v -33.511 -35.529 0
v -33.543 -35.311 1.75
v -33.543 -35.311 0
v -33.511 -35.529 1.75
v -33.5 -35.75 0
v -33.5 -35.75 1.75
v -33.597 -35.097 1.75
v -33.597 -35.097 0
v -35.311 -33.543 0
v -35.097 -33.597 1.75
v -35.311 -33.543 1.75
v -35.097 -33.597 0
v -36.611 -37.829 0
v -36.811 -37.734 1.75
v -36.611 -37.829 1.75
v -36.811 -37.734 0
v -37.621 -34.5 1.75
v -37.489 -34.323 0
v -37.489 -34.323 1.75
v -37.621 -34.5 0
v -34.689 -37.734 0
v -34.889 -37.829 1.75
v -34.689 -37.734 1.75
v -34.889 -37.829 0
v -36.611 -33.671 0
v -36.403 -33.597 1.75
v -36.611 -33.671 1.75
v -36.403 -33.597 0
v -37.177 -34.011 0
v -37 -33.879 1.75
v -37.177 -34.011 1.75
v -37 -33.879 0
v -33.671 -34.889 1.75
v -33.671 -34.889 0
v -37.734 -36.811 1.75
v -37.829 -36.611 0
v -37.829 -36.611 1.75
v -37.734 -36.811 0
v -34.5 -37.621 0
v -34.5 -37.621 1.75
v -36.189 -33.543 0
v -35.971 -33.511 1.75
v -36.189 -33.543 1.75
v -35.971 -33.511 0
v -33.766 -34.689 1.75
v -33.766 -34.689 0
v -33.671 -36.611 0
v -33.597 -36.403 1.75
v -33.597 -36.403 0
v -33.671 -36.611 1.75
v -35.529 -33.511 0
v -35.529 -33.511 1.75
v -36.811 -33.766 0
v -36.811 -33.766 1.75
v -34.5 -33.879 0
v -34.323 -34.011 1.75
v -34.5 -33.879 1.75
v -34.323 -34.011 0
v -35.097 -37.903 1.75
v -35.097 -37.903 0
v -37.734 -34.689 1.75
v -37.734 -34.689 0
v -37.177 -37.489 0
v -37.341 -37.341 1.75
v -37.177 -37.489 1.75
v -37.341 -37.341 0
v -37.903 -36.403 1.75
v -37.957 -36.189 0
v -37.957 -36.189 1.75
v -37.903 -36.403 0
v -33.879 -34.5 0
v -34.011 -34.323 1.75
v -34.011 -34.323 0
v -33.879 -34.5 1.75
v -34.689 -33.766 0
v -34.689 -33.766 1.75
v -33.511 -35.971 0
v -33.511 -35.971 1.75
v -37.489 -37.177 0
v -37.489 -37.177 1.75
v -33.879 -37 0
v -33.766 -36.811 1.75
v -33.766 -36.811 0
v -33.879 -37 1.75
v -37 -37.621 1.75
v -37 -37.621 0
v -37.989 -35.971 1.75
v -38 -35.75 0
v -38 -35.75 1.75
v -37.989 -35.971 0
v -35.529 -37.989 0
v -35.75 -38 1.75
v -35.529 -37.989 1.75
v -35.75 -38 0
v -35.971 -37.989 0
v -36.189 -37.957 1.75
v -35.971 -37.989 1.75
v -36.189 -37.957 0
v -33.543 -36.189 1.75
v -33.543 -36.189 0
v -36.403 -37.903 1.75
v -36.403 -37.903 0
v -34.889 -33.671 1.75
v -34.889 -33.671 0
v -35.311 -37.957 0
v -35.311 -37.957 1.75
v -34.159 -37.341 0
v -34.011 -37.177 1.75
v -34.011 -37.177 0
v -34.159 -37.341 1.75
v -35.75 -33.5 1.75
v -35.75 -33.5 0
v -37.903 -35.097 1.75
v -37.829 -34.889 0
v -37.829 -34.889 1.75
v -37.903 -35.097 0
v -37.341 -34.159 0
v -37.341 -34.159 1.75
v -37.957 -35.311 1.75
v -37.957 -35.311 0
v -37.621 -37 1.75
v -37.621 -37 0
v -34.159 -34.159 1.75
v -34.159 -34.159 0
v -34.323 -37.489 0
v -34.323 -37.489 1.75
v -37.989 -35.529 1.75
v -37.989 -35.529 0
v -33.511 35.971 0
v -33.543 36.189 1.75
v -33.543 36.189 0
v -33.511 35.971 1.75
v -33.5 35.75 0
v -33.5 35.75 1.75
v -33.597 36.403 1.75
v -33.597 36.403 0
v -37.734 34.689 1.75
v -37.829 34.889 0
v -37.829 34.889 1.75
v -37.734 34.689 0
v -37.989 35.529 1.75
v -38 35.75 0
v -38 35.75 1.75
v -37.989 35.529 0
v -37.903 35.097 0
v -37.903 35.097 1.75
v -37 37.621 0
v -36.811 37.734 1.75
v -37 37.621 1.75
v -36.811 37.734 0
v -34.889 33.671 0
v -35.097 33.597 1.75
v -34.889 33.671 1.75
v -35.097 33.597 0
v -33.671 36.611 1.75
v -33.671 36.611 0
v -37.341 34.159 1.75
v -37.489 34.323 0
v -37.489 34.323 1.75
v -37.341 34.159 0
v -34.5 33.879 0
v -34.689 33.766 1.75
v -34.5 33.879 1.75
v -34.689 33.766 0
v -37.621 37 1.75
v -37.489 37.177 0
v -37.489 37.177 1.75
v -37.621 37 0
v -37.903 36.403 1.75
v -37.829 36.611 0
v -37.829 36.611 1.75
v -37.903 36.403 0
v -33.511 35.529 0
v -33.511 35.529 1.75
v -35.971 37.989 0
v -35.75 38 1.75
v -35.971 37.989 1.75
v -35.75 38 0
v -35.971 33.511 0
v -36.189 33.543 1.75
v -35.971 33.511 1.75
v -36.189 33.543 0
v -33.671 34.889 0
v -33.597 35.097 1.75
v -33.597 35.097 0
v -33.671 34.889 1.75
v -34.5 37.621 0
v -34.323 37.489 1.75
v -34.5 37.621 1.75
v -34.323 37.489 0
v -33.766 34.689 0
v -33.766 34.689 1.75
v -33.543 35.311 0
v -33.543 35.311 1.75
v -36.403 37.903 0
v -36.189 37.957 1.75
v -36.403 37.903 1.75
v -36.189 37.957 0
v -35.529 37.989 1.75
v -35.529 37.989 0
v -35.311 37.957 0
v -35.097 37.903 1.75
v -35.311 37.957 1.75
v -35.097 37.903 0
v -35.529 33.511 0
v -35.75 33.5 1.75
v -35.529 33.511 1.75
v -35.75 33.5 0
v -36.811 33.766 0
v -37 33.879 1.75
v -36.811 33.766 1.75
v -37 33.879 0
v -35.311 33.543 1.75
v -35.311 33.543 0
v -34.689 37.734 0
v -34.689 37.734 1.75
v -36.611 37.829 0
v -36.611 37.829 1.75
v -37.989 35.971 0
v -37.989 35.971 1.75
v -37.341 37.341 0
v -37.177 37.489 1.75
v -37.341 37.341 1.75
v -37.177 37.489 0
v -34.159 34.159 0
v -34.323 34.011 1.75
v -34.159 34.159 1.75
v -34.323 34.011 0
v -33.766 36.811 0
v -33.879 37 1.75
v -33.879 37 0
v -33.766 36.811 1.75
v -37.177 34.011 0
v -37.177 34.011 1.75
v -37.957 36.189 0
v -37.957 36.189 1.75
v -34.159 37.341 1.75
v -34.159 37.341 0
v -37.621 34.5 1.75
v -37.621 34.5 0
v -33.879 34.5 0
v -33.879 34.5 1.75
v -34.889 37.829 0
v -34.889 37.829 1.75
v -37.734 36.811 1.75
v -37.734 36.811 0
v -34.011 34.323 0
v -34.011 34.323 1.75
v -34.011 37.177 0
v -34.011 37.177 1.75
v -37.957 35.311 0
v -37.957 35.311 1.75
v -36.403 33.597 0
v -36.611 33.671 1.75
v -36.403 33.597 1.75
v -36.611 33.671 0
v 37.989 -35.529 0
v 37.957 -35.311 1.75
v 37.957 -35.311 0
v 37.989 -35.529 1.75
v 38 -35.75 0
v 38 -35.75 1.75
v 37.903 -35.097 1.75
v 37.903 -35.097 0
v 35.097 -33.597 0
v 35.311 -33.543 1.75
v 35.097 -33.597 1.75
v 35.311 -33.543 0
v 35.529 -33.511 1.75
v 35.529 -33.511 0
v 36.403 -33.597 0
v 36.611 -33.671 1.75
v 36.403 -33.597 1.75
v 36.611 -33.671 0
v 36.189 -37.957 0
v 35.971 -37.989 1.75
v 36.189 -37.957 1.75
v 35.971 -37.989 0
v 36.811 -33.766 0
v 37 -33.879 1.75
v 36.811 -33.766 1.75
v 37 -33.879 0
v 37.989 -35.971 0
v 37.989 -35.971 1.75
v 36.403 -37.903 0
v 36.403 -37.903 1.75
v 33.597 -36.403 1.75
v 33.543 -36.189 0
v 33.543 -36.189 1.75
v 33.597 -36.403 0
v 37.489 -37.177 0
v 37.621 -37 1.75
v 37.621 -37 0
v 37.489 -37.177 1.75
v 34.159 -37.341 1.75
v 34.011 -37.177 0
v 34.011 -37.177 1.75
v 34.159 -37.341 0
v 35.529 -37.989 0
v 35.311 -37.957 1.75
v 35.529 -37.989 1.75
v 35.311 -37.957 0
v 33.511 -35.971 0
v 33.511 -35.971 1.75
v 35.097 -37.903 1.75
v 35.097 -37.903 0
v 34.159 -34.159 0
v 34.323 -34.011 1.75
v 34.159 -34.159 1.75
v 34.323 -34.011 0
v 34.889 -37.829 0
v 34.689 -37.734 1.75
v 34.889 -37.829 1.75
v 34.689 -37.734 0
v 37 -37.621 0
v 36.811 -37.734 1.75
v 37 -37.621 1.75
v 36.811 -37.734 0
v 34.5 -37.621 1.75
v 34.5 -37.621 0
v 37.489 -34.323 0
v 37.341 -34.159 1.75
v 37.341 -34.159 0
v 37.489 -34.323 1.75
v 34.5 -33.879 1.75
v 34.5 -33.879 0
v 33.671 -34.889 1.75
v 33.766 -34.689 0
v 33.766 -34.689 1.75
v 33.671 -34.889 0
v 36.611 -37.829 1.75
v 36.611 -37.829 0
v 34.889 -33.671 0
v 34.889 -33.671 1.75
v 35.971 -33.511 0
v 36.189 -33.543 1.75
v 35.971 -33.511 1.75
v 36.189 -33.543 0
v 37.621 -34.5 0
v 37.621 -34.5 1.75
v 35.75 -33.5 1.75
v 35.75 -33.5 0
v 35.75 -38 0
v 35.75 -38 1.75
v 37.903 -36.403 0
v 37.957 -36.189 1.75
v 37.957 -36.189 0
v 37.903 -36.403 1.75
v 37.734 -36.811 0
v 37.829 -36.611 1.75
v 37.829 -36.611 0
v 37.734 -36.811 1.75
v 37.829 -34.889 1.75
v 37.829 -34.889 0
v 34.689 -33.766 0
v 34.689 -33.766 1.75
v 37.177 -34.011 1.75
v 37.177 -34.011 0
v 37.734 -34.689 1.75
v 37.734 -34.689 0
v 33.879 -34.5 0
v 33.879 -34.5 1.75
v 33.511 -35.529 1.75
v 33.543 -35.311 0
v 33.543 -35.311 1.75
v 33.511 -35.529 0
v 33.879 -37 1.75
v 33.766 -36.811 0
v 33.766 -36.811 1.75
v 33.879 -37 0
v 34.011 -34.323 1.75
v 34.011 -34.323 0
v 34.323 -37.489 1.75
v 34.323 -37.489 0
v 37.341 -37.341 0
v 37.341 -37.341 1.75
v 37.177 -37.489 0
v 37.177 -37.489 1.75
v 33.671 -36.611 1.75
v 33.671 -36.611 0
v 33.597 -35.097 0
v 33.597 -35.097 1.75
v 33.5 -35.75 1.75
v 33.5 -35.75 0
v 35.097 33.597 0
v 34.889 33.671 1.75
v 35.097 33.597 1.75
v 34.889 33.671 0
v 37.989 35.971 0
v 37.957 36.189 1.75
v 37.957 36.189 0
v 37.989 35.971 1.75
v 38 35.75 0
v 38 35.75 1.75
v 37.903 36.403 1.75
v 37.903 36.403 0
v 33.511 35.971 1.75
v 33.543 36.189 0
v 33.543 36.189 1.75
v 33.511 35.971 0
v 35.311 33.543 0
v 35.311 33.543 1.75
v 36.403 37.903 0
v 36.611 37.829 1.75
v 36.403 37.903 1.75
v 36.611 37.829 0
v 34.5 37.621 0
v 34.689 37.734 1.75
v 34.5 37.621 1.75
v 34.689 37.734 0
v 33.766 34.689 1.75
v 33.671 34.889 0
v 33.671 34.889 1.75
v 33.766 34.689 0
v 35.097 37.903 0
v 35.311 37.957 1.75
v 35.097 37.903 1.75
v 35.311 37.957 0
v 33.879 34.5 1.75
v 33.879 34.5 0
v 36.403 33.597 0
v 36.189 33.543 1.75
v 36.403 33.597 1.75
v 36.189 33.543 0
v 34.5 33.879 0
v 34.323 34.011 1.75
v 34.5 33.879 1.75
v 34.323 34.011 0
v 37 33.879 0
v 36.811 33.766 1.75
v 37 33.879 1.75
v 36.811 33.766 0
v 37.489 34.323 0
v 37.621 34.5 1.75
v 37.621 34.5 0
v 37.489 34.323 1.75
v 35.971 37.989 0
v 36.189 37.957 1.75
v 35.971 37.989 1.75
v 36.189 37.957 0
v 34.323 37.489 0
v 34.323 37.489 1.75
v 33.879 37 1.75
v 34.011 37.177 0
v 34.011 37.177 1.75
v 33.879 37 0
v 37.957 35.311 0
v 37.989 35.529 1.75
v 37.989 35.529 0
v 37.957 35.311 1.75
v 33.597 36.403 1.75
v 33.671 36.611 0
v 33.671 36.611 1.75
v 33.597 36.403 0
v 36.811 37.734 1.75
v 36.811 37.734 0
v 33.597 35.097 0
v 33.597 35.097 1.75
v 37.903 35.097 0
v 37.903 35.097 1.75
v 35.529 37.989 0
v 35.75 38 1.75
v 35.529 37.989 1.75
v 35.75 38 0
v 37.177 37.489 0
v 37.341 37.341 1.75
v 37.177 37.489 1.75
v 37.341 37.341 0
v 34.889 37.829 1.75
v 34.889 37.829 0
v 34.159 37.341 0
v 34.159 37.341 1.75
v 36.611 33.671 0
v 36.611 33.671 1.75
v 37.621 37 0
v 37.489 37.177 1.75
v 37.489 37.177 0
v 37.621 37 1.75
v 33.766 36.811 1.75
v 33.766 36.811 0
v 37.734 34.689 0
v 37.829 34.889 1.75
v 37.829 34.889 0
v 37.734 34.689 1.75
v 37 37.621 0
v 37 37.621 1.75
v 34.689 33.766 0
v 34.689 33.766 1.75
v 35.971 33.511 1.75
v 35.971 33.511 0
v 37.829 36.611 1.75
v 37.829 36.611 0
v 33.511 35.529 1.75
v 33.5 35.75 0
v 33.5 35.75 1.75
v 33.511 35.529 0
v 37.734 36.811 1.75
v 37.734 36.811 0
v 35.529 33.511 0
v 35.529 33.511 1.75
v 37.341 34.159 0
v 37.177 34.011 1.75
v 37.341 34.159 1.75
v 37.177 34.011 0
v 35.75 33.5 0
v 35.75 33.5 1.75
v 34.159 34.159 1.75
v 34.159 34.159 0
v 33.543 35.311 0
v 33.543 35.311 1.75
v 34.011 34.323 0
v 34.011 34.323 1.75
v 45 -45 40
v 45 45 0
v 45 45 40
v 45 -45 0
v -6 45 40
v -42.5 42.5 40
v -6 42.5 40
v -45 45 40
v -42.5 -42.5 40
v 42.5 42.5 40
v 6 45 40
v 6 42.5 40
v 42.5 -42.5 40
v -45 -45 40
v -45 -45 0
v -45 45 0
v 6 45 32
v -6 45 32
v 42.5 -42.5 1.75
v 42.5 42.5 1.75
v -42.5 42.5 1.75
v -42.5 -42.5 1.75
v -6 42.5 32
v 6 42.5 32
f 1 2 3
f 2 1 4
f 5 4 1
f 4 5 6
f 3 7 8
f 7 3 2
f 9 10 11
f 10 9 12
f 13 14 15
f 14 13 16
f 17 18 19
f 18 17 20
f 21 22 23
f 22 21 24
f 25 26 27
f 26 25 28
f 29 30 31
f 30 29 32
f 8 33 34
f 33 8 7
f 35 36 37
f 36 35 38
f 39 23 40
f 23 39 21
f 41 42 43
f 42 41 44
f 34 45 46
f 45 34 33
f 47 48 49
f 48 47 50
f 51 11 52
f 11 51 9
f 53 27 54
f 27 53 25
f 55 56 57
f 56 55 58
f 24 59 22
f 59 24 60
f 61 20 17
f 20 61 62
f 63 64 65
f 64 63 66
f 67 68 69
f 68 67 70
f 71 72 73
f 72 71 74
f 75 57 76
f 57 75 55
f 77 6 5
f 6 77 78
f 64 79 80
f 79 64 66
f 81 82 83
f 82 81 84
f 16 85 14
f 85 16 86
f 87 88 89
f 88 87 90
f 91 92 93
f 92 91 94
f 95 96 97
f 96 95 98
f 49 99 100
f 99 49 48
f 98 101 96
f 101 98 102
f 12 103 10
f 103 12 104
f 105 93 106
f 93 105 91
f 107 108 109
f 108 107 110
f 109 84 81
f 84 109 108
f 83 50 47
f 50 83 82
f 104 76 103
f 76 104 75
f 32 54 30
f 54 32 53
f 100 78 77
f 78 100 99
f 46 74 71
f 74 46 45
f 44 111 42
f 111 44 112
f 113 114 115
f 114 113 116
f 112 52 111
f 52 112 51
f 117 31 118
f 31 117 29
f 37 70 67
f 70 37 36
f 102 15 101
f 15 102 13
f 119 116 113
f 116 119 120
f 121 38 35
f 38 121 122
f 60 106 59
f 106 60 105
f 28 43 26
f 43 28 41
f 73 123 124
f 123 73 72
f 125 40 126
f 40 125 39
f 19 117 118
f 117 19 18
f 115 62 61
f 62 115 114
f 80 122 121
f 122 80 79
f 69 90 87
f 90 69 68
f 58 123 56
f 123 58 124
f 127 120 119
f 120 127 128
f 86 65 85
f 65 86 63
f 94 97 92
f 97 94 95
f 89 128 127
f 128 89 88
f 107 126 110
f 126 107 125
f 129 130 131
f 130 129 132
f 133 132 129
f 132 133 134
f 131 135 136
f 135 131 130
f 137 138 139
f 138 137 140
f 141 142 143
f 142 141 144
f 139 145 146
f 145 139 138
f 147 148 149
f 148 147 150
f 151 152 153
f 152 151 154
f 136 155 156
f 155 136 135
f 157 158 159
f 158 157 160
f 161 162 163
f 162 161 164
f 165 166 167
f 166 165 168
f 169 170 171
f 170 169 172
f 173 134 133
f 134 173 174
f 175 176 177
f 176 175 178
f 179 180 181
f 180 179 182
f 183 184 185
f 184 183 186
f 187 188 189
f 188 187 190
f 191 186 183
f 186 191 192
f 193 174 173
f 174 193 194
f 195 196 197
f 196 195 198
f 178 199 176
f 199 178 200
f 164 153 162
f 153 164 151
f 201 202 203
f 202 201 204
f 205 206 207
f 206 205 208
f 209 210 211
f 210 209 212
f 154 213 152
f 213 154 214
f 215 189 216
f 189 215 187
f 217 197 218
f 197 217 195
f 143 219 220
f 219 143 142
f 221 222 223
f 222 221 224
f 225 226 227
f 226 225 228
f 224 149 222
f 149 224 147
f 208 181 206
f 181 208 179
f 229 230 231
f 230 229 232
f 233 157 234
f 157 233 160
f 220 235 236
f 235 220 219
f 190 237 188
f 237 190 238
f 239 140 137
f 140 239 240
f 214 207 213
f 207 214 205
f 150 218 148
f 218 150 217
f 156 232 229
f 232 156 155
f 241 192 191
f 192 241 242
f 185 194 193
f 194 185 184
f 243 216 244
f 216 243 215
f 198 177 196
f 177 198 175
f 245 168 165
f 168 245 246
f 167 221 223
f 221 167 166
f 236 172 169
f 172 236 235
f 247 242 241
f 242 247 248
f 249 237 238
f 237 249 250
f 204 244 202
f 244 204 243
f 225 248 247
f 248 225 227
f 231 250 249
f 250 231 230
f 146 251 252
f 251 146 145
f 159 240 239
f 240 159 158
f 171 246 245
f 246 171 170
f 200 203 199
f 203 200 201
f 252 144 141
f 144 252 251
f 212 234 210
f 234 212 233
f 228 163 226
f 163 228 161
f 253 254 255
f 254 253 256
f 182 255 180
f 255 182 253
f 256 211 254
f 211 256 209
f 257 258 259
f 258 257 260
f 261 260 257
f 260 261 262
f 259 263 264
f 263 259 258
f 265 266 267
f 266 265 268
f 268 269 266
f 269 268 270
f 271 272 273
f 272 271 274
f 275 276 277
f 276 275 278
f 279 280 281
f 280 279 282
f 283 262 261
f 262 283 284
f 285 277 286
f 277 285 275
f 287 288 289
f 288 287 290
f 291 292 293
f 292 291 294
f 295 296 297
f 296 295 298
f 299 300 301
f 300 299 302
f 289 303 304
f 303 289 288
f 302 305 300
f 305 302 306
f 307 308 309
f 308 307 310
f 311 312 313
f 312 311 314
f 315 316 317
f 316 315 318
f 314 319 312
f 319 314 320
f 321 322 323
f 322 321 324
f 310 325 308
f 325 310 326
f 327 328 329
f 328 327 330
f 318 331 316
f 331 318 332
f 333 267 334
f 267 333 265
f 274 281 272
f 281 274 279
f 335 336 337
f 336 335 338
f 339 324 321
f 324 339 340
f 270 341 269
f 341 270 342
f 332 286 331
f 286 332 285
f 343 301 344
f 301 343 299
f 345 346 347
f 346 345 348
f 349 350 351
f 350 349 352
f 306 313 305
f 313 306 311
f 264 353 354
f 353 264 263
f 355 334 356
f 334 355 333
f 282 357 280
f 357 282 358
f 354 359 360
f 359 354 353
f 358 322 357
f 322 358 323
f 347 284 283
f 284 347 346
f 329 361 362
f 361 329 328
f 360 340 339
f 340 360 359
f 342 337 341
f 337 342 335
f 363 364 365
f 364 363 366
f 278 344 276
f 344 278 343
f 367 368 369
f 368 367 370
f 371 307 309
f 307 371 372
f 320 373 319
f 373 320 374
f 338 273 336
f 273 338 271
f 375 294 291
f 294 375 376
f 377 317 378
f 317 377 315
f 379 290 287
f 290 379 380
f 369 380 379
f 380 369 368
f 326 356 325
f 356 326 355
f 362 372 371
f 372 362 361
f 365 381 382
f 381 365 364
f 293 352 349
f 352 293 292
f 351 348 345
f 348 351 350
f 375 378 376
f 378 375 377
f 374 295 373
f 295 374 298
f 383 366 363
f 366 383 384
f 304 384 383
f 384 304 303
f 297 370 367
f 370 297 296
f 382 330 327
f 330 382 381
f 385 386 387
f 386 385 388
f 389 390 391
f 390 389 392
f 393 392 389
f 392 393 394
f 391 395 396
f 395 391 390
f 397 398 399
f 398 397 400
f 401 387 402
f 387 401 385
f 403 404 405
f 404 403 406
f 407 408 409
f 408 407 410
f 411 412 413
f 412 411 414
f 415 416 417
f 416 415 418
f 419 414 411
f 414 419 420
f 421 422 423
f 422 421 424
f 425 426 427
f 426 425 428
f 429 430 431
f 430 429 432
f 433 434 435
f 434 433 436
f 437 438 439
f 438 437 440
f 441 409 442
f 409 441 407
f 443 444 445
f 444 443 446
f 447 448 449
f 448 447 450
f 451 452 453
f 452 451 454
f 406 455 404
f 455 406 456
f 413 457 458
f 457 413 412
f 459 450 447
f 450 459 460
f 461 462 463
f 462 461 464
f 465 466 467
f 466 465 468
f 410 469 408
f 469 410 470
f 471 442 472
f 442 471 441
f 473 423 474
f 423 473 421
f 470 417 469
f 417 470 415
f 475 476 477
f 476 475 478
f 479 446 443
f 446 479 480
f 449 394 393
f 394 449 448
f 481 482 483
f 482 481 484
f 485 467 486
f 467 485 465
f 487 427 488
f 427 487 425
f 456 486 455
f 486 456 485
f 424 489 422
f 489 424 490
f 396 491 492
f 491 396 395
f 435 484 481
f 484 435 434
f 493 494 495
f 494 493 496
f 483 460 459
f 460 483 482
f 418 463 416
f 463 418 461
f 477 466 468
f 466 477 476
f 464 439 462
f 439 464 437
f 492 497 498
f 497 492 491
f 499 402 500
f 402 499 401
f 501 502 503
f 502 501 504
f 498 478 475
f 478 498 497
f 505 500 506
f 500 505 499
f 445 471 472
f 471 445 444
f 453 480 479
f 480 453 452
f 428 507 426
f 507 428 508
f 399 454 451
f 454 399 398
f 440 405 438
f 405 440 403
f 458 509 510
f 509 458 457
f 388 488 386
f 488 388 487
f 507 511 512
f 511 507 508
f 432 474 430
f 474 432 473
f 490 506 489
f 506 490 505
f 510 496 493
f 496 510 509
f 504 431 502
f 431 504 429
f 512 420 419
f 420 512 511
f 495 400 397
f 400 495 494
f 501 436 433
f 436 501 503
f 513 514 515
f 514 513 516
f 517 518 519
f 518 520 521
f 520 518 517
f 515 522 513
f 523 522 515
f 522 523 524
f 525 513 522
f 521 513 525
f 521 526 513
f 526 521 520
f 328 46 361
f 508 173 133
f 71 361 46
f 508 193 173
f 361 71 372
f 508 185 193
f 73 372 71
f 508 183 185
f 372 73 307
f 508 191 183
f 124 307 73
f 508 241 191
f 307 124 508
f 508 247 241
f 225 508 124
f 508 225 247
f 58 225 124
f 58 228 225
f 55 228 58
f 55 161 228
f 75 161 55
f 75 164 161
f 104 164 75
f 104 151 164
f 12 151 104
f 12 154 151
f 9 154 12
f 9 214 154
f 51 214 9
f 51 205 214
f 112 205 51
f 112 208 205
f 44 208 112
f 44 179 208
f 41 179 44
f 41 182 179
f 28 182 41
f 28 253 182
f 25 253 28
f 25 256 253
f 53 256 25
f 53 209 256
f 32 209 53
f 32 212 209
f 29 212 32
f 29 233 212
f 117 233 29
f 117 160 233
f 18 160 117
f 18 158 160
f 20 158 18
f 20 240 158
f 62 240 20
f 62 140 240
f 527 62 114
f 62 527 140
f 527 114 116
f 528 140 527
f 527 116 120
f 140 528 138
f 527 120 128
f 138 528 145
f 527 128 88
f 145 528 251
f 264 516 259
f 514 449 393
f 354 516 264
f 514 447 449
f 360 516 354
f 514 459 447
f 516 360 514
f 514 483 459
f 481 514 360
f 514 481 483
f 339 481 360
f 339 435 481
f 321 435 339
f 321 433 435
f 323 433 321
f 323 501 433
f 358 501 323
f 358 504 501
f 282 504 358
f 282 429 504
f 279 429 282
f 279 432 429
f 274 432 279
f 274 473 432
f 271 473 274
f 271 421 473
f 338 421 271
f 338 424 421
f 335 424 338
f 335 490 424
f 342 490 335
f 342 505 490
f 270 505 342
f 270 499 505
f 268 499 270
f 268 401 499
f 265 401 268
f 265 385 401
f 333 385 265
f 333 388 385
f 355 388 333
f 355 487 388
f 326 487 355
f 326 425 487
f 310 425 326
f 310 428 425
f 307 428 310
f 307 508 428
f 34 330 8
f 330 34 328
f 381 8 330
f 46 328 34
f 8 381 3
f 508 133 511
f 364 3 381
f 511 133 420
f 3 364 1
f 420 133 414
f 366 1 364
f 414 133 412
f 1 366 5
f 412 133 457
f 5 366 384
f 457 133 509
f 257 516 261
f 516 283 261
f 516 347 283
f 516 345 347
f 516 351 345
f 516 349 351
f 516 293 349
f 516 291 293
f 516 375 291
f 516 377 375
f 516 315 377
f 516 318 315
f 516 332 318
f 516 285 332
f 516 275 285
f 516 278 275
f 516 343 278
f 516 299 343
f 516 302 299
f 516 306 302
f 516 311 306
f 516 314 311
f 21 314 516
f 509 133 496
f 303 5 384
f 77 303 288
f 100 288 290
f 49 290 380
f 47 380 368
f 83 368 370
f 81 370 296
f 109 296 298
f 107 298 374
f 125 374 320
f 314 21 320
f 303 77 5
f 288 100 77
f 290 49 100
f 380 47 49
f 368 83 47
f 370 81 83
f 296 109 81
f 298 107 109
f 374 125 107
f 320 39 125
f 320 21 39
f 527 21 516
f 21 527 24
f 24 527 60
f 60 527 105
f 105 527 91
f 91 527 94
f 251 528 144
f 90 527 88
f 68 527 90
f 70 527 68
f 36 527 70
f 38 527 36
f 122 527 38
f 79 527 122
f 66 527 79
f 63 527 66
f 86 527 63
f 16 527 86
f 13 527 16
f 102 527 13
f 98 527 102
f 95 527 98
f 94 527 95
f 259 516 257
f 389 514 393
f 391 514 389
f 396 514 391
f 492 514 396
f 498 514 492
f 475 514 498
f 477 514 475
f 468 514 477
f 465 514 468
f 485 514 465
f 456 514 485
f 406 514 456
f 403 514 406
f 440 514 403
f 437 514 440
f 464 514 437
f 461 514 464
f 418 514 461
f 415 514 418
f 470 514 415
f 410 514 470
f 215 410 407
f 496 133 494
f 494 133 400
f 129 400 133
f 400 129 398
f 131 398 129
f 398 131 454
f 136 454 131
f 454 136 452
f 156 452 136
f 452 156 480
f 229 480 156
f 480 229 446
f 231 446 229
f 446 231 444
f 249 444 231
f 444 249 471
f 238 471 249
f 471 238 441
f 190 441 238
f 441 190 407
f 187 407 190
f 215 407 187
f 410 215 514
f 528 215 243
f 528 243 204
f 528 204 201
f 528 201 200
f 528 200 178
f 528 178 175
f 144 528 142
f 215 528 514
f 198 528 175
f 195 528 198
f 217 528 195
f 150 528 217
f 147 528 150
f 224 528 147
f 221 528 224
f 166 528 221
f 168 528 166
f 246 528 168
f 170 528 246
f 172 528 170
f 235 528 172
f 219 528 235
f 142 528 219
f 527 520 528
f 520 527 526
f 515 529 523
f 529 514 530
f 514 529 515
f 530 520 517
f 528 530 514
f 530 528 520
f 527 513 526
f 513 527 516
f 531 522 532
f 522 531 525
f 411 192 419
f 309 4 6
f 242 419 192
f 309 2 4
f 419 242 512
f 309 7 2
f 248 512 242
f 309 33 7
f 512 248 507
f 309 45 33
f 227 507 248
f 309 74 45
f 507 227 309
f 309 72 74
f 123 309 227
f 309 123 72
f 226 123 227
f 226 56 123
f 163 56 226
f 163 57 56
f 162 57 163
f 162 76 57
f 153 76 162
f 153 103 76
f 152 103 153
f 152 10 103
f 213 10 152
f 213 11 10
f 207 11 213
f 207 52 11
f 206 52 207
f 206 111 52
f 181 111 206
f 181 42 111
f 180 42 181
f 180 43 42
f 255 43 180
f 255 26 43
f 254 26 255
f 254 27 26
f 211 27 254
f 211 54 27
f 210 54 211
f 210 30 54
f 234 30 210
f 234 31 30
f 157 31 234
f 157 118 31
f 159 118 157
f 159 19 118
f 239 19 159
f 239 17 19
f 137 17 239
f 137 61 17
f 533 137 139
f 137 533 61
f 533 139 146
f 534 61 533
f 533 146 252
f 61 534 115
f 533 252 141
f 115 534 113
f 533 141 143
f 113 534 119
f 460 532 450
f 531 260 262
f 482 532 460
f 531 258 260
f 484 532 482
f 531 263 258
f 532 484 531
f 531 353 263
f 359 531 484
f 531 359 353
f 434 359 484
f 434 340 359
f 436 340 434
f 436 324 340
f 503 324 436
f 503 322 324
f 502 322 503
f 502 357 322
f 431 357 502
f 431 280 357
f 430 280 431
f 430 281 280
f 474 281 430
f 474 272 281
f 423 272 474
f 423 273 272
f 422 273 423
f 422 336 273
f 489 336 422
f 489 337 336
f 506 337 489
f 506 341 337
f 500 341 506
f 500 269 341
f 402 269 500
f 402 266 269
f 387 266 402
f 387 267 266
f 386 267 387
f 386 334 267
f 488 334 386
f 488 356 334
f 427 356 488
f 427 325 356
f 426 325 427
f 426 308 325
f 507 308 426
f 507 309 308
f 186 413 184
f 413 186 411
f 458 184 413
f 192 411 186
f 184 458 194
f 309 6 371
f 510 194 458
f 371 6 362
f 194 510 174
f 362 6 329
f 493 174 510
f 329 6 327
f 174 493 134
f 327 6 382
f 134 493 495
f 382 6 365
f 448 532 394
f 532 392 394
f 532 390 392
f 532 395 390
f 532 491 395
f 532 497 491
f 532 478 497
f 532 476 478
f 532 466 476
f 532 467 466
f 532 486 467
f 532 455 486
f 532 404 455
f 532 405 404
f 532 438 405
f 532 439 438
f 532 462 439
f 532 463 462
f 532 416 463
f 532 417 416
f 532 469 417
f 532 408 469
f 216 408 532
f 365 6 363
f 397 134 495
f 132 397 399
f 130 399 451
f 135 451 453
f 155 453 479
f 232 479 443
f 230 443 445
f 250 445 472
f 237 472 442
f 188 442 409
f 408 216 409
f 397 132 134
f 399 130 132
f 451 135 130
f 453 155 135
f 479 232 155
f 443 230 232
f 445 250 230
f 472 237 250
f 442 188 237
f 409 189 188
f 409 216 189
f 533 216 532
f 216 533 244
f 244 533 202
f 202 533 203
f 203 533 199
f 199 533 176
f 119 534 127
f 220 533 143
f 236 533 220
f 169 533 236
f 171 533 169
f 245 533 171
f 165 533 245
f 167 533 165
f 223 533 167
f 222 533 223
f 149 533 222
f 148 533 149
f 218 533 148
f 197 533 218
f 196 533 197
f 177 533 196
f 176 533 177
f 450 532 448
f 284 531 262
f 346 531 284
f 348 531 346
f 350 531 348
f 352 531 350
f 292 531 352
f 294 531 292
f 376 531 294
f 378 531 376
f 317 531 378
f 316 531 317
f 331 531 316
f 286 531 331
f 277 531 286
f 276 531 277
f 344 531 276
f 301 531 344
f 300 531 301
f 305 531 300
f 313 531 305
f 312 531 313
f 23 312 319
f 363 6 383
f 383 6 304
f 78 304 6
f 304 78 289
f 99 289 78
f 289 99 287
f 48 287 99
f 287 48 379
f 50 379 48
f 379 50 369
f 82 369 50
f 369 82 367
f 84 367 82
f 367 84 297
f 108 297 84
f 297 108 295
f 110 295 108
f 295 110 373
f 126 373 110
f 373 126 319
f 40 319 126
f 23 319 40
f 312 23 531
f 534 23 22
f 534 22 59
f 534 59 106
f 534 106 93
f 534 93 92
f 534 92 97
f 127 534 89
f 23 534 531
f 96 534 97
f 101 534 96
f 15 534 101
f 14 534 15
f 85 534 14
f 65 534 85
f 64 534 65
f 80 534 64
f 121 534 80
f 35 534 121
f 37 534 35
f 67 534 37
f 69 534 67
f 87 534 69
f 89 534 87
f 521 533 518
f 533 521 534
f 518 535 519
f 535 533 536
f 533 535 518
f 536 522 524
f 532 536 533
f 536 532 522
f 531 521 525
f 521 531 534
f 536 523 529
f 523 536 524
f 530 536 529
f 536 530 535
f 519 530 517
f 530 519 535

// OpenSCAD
// Parámetros dimensionales
ext_w = 90;              // Ancho exterior (X)
ext_d = 90;              // Profundidad exterior (Y)
wall_t = 2.5;            // Espesor de paredes
plate_h = 2;             // Espesor placa superior
total_h = 40;            // Altura total
screw_pitch = 71.5;      // Patrón cuadrado agujeros tornillos
screw_d = 4.5;           // Diámetro agujeros tornillos M4
notch_w = 12;            // Ancho muesca cable
notch_h = 8;             // Profundidad muesca cable

$fn = 64;

difference() {
    // Caja exterior sólida (90 x 90 x 40)
    translate([0, 0, total_h/2])
        cube([ext_w, ext_d, total_h], center = true);
    
    // Restar interior para crear paredes huecas
    // El hueco debe ir desde z=2 hasta z=40
    int_w = ext_w - 2*wall_t;
    int_d = ext_d - 2*wall_t;
    int_h = total_h - plate_h;  // 38 mm
    translate([0, 0, plate_h + int_h/2])
        cube([int_w, int_d, int_h + 0.5], center = true);
    
    // Agujeros para tornillos M4 en placa superior
    for(x = [-1, 1]) {
        for(y = [-1, 1]) {
            translate([x * screw_pitch/2, y * screw_pitch/2, -0.5])
                cylinder(d = screw_d, h = plate_h + 1);
        }
    }
    
    // Muesca para cable en pared +Y
    translate([0, ext_d/2 - wall_t/2, total_h - notch_h/2])
        cube([notch_w, wall_t + 0.5, notch_h], center = true);
}
